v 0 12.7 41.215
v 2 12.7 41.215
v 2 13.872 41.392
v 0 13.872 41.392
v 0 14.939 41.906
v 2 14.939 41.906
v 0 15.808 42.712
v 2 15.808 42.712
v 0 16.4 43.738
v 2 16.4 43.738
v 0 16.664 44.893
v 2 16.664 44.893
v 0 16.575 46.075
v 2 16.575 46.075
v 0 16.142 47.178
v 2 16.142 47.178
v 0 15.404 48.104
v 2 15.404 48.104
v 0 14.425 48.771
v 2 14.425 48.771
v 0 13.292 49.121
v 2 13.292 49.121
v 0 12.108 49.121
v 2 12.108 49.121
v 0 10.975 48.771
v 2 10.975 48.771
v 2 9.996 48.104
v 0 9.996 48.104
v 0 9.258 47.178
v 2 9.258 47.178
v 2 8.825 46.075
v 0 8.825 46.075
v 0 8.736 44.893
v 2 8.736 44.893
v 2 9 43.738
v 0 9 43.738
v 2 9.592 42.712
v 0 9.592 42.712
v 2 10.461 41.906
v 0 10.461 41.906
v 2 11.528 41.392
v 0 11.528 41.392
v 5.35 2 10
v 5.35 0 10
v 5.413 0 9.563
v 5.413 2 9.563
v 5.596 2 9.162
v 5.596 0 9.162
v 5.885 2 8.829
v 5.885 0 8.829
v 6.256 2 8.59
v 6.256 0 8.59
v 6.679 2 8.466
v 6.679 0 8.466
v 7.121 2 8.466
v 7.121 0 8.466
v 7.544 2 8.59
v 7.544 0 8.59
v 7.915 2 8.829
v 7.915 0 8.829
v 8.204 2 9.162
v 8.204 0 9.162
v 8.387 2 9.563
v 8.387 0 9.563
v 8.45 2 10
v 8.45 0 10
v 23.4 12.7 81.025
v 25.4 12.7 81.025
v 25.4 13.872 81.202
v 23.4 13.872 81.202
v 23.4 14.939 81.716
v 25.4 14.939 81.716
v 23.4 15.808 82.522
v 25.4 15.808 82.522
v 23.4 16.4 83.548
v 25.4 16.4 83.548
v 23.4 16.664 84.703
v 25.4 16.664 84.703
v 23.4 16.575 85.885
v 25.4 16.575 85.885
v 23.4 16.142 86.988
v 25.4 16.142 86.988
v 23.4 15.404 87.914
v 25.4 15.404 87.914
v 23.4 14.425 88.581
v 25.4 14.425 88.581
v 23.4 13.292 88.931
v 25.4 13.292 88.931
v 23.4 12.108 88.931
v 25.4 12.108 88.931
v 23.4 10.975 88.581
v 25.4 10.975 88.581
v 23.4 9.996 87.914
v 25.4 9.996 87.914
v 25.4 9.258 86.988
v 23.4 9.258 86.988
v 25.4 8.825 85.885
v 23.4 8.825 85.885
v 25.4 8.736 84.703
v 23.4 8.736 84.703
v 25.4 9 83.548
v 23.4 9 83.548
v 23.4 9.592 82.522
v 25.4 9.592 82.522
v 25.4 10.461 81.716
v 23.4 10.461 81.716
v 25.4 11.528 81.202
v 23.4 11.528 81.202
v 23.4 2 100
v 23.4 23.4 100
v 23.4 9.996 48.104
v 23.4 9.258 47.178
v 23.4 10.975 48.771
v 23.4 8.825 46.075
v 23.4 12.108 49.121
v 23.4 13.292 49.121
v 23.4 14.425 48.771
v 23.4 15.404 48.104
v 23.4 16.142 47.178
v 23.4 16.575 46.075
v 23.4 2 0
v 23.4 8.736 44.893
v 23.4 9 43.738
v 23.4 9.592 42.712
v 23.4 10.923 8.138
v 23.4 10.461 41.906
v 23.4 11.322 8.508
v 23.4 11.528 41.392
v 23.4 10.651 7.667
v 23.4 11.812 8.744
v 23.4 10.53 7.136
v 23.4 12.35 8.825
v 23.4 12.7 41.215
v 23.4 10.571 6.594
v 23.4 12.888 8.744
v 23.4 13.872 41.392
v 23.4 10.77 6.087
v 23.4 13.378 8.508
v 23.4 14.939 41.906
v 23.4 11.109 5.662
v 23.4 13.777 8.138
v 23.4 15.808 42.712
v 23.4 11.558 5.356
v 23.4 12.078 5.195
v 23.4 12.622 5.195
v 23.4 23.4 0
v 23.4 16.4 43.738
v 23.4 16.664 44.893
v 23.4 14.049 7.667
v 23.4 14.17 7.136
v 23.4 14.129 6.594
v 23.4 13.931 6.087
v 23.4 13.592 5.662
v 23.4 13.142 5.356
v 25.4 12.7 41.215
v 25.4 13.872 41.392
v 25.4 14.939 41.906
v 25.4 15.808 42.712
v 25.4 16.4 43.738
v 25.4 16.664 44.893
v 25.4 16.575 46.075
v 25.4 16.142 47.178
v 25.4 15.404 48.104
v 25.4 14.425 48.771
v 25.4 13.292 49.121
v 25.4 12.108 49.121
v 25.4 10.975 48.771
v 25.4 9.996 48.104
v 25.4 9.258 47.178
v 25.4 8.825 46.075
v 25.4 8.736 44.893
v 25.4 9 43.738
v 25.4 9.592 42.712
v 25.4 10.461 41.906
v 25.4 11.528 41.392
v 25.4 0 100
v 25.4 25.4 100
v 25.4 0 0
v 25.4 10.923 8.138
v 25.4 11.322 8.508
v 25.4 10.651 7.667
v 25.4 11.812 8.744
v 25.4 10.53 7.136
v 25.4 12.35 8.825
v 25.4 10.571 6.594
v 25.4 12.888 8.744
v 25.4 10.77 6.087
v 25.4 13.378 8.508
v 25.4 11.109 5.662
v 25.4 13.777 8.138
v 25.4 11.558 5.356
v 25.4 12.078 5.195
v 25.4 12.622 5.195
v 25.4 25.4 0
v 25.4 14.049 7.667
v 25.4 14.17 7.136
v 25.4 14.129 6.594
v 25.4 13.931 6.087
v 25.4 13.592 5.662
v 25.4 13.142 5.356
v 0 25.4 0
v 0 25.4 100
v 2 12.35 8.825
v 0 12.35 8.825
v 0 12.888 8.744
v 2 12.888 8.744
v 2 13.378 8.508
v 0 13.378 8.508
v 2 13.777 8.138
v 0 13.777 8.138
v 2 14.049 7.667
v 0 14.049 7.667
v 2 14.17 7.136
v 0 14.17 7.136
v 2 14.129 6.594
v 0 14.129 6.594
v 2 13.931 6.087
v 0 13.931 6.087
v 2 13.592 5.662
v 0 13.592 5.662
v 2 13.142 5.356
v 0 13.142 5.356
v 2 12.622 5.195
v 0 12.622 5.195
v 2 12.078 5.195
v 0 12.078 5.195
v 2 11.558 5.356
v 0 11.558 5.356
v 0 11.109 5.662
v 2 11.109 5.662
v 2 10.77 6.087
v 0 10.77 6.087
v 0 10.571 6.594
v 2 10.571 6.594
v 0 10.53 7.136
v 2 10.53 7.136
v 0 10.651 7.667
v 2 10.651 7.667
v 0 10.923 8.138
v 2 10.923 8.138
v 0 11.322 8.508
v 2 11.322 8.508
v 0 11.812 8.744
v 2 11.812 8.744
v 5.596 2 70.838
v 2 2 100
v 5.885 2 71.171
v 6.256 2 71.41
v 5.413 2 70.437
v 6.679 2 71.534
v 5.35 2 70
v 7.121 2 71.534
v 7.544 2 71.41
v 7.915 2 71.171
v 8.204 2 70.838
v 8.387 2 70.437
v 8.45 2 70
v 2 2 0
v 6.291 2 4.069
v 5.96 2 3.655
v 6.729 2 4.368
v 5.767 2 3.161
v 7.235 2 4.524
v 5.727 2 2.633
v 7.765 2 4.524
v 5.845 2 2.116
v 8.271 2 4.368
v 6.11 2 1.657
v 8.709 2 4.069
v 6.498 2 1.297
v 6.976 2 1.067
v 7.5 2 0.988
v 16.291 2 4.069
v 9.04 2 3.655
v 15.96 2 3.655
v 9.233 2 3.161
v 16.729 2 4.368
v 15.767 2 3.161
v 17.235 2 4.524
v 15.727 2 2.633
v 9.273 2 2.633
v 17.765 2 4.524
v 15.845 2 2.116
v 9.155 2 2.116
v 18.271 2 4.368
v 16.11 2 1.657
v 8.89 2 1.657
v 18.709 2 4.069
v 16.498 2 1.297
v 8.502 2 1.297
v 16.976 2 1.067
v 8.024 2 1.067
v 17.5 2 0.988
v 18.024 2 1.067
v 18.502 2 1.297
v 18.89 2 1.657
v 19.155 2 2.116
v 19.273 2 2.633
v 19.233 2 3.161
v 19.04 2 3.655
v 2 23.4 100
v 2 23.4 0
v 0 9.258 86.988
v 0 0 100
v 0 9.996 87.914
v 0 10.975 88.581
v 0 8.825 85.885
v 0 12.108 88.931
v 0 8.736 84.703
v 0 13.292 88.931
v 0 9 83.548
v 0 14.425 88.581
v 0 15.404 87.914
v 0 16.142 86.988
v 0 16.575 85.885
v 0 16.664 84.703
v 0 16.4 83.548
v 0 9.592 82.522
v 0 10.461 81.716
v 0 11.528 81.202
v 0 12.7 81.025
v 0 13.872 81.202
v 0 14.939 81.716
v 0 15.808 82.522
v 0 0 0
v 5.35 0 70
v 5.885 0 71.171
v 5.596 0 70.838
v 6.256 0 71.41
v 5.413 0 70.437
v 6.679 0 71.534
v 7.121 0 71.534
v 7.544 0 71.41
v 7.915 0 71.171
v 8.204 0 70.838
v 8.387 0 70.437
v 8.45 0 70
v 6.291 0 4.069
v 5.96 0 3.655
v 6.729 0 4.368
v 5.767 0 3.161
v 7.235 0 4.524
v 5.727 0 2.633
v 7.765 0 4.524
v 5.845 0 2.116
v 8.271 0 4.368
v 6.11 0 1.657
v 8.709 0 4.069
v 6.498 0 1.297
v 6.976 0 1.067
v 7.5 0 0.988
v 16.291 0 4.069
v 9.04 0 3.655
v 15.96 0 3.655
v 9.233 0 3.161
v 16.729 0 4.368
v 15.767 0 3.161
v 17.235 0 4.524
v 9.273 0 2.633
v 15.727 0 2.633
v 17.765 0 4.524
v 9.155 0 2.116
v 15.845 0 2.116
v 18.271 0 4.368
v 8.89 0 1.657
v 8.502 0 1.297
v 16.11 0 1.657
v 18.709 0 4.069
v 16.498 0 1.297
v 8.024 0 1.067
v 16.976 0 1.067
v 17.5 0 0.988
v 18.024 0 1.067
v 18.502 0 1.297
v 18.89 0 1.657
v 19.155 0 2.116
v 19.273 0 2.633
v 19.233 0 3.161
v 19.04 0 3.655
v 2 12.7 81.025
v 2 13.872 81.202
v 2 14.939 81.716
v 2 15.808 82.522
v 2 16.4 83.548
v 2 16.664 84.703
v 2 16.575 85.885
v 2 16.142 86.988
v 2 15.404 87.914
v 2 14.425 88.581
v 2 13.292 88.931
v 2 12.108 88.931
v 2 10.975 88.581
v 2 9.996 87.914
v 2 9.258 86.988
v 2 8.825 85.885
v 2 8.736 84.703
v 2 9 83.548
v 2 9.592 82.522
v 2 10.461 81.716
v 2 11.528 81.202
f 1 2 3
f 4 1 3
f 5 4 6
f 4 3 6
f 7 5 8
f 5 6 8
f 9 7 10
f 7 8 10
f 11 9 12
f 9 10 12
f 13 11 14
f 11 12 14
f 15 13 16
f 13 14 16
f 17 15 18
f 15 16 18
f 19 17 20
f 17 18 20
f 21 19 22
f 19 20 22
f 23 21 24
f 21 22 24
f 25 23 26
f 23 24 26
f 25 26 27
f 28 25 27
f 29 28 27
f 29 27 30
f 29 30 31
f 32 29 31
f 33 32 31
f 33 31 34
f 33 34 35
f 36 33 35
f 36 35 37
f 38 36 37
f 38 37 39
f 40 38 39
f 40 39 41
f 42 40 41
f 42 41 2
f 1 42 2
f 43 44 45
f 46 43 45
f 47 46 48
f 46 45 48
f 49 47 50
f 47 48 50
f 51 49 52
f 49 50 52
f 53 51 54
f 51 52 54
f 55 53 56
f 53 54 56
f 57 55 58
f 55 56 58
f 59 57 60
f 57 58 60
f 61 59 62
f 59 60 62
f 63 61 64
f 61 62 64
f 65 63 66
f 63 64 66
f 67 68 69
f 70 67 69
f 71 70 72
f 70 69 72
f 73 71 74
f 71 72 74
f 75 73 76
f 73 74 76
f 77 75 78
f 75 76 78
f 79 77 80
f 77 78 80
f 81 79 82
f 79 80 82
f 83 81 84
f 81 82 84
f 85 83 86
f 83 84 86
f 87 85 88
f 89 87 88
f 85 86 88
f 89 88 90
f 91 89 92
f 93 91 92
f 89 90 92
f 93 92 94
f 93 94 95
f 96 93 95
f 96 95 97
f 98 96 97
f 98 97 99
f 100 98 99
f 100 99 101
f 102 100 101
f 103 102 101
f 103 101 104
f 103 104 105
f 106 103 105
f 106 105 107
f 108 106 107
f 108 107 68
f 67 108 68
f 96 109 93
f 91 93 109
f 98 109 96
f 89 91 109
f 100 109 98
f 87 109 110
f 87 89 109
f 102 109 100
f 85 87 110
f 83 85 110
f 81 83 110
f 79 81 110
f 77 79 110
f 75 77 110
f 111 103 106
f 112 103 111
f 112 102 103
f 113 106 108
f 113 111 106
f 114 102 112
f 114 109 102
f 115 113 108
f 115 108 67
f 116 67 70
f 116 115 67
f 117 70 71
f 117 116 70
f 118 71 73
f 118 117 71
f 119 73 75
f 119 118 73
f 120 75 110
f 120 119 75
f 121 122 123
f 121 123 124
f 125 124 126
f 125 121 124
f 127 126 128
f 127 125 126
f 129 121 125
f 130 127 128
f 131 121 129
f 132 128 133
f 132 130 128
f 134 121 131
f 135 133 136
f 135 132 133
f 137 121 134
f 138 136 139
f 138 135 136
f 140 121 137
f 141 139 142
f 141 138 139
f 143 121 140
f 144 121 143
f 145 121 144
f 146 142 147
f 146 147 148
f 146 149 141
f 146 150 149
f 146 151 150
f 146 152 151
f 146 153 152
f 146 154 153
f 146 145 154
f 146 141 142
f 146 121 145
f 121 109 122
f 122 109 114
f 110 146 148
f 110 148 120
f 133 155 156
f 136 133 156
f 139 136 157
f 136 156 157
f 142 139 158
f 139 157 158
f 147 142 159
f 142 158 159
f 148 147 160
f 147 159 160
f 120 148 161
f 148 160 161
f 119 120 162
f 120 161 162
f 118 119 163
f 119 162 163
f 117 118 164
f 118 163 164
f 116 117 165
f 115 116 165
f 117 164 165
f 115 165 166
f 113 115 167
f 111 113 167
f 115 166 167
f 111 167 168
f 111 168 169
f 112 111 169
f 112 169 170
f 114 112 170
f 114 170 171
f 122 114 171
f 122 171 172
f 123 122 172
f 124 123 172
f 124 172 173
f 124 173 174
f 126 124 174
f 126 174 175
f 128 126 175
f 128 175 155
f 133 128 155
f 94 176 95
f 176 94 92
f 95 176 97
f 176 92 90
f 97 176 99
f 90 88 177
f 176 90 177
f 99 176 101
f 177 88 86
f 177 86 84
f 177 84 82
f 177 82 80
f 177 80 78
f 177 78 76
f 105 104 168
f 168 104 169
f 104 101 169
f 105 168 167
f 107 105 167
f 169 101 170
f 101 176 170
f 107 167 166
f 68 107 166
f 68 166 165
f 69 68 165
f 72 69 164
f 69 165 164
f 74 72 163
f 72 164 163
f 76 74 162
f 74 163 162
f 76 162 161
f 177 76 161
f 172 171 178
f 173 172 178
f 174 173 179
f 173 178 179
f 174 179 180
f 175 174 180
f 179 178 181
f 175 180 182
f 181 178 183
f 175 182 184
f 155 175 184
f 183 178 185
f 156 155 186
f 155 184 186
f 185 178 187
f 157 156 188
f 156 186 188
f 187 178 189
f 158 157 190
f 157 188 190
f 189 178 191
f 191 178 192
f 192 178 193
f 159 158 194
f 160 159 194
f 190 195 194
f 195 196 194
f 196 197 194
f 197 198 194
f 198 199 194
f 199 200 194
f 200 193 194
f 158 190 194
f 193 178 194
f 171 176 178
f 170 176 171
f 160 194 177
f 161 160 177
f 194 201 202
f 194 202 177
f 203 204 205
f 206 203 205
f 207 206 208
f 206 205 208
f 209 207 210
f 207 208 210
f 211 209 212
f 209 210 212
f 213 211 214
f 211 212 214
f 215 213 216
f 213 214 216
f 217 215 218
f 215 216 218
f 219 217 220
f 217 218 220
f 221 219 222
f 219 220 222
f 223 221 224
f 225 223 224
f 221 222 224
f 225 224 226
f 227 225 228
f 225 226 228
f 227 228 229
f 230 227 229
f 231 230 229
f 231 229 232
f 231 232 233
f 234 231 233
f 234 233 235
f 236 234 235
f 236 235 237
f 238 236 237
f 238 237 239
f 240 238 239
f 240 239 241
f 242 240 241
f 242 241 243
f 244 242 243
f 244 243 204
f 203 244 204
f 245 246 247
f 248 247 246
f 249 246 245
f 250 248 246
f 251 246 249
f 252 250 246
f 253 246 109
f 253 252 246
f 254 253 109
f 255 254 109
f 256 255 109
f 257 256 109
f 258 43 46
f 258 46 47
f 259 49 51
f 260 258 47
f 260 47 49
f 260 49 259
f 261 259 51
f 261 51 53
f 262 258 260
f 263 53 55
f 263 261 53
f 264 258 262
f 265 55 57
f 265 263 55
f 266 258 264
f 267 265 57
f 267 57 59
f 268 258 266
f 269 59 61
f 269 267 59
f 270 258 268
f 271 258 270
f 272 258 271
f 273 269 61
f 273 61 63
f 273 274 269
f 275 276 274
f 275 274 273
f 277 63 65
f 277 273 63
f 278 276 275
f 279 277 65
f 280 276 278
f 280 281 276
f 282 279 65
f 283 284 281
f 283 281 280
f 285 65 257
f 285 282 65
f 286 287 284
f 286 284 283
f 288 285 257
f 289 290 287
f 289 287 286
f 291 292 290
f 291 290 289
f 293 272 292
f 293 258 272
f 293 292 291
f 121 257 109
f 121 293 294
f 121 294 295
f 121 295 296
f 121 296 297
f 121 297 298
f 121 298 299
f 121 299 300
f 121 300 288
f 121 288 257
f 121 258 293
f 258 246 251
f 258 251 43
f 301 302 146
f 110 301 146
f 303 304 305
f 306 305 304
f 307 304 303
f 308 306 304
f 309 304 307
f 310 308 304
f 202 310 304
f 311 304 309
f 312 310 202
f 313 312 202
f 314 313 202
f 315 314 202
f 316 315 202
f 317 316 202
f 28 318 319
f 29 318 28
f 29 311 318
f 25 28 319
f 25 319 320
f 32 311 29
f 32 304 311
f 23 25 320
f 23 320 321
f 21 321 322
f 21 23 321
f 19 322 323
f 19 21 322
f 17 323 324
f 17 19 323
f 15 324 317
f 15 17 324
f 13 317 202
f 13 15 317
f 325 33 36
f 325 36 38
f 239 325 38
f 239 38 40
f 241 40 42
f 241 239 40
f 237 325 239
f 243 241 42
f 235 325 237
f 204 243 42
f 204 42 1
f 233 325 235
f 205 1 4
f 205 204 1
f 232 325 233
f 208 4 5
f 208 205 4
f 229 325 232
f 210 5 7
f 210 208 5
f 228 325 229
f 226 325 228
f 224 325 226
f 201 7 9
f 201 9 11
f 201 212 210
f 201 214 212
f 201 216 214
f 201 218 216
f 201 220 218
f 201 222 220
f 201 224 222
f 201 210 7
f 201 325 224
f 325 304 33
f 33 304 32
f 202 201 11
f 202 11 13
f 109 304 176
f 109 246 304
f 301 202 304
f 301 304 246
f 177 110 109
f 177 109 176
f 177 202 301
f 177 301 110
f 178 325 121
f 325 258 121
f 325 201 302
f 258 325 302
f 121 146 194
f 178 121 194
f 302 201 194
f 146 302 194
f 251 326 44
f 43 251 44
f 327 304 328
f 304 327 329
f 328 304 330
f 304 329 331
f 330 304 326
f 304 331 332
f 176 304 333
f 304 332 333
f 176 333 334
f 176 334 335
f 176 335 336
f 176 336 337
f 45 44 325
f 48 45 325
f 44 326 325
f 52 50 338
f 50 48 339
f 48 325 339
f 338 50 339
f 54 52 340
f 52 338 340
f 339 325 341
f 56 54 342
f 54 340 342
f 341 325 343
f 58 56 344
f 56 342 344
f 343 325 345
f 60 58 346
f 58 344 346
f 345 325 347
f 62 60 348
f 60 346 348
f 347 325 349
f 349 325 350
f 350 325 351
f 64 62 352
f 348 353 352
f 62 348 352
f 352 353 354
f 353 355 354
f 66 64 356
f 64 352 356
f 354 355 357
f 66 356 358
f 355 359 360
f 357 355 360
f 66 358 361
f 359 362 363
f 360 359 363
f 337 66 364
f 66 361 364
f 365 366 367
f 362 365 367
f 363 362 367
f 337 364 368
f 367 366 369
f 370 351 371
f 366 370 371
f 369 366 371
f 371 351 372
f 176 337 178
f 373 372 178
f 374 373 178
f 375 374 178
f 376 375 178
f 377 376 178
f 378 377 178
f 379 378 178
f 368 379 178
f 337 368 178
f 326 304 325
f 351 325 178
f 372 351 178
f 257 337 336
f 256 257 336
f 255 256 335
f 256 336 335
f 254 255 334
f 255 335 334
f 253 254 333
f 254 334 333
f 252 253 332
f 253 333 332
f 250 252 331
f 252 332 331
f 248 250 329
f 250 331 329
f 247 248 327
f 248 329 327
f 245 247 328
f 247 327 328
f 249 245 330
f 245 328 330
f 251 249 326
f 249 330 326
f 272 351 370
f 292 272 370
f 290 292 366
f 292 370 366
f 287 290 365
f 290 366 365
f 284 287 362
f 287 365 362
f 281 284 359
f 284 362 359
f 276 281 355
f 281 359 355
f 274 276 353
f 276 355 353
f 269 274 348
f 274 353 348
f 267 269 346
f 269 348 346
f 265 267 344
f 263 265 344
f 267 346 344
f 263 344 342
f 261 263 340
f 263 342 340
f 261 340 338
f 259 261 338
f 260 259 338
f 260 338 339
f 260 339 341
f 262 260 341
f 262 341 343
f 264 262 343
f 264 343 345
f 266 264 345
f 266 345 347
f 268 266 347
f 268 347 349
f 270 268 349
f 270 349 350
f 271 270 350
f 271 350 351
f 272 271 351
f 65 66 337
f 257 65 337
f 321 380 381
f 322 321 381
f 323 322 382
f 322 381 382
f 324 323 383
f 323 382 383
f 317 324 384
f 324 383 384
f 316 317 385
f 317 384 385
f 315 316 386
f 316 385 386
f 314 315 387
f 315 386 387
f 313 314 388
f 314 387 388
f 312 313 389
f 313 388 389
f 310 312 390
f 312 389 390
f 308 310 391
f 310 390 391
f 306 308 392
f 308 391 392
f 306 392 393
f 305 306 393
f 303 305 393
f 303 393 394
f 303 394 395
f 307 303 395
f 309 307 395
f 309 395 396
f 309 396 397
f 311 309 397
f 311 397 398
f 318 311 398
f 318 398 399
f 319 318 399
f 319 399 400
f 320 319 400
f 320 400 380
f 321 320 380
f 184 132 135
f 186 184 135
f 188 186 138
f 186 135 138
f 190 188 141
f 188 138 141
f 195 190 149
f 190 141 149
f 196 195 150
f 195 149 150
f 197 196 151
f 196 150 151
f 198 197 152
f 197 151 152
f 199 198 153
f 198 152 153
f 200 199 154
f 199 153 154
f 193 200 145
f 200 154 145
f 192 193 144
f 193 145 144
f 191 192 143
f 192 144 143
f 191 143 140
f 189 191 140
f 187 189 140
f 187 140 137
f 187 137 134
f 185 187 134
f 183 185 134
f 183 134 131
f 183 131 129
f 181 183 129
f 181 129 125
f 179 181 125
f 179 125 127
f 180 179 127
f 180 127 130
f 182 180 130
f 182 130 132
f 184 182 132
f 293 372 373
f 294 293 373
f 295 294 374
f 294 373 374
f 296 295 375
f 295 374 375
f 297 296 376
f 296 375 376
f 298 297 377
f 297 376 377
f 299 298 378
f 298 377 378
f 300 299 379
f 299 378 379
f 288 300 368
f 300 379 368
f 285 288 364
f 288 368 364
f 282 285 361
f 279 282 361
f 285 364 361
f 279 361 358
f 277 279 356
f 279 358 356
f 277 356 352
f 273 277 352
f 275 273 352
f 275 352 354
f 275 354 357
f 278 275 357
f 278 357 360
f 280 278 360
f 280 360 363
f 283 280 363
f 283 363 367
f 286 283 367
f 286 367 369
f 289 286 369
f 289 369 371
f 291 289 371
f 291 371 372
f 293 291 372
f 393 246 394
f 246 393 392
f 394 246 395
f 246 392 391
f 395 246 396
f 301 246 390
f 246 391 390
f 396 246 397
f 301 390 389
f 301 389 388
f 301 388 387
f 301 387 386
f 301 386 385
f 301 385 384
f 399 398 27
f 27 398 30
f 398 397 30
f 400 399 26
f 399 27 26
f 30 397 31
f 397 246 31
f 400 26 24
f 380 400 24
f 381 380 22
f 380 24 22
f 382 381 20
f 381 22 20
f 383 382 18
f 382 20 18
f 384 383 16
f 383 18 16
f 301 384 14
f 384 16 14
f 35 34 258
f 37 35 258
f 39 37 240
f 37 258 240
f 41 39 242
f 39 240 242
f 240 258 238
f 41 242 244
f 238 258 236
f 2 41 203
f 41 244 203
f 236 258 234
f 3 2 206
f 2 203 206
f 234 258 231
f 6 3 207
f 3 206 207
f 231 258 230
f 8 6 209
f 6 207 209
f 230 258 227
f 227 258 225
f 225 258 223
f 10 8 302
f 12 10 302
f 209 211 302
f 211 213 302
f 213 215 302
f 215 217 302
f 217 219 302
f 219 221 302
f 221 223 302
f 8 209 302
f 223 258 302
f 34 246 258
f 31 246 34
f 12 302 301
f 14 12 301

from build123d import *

# Parameters (mm, degrees)
SKETCH1_W           = 25.4
SKETCH1_H           = 25.4
SKETCH1_W_2         = 21.4
SKETCH1_H_2         = 21.4
BOSS_EXTRUDE1_DEPTH = 100
SKETCH2_R           = 3.975
CUT_EXTRUDE1_DEPTH  = 50
SKETCH3_R           = 1.55
CUT_EXTRUDE4_DEPTH  = 10
SKETCH4_R           = 1.778
CUT_EXTRUDE5_DEPTH  = 10
CUT_EXTRUDE6_REACH  = 108.256
SKETCH5_R           = 1.825


with BuildPart() as part:
    # Sketch1 → Boss-Extrude1 (new body)
    with BuildSketch(Plane.XY):
        with Locations((12.7, 12.7)):
            Rectangle(SKETCH1_W, SKETCH1_H)
        with Locations((12.7, 12.7)):
            Rectangle(SKETCH1_W_2, SKETCH1_H_2, mode=Mode.SUBTRACT)
    extrude(amount=BOSS_EXTRUDE1_DEPTH)

    # Sketch2 → Cut-Extrude1 (cut)
    with BuildSketch(Plane(origin=(25.4, 0, 0), x_dir=(0, 0, -1), z_dir=(1, 0, 0))):
        with Locations((-85, 12.7)):
            Circle(SKETCH2_R)
        with Locations((-45.19, 12.7)):
            Circle(SKETCH2_R)
    extrude(amount=-CUT_EXTRUDE1_DEPTH, mode=Mode.SUBTRACT)

    # Sketch3 → Cut-Extrude4 (cut)
    with BuildSketch(Plane.XZ):
        with BuildLine():
            Line((8.45, 10), (8.45, 70))
            ThreePointArc((8.45, 70), (6.9, 68.45), (5.35, 70))
            Line((5.35, 70), (5.35, 10))
            ThreePointArc((5.35, 10), (6.9, 11.55), (8.45, 10))
        make_face()
        with Locations((6.9, 10)):
            Circle(SKETCH3_R)
        with BuildLine():
            ThreePointArc((5.35, 70), (6.9, 68.45), (8.45, 70))
            ThreePointArc((8.45, 70), (6.9, 71.55), (5.35, 70))
        make_face()
    extrude(amount=-CUT_EXTRUDE4_DEPTH, mode=Mode.SUBTRACT)

    # Sketch4 → Cut-Extrude5 (cut)
    with BuildSketch(Plane.XZ):
        with Locations(Location((7.5, 2.765729771, 0), (0, 0, 270))):
            Circle(SKETCH4_R)
        with Locations(Location((17.5, 2.765729771, 0), (0, 0, 270))):
            Circle(SKETCH4_R)
    extrude(amount=-CUT_EXTRUDE5_DEPTH, mode=Mode.SUBTRACT)

    # Cut-Extrude6: up to this face of the body (flat: up to its plane)
    cut_extrude6_end = Plane(part.part.faces().sort_by_distance((25.4, 12.7, 49.385999137))[0])
    # Sketch5 → Cut-Extrude6 (cut, up to the picked face)
    with BuildSketch(Plane.ZY, mode=Mode.PRIVATE) as cut_extrude6_sk1:
        with Locations((7, 12.350192929)):
            Circle(SKETCH5_R)
    cut_extrude6_tool1 = split(extrude(cut_extrude6_sk1.sketch, amount=-CUT_EXTRUDE6_REACH, mode=Mode.PRIVATE), bisect_by=cut_extrude6_end, keep=Keep.BOTH, mode=Mode.PRIVATE)
    add(cut_extrude6_tool1.solids().sort_by(Axis((0, 12.350193, 7), (1, 0, 0)))[0], mode=Mode.SUBTRACT)


solid = part.part
